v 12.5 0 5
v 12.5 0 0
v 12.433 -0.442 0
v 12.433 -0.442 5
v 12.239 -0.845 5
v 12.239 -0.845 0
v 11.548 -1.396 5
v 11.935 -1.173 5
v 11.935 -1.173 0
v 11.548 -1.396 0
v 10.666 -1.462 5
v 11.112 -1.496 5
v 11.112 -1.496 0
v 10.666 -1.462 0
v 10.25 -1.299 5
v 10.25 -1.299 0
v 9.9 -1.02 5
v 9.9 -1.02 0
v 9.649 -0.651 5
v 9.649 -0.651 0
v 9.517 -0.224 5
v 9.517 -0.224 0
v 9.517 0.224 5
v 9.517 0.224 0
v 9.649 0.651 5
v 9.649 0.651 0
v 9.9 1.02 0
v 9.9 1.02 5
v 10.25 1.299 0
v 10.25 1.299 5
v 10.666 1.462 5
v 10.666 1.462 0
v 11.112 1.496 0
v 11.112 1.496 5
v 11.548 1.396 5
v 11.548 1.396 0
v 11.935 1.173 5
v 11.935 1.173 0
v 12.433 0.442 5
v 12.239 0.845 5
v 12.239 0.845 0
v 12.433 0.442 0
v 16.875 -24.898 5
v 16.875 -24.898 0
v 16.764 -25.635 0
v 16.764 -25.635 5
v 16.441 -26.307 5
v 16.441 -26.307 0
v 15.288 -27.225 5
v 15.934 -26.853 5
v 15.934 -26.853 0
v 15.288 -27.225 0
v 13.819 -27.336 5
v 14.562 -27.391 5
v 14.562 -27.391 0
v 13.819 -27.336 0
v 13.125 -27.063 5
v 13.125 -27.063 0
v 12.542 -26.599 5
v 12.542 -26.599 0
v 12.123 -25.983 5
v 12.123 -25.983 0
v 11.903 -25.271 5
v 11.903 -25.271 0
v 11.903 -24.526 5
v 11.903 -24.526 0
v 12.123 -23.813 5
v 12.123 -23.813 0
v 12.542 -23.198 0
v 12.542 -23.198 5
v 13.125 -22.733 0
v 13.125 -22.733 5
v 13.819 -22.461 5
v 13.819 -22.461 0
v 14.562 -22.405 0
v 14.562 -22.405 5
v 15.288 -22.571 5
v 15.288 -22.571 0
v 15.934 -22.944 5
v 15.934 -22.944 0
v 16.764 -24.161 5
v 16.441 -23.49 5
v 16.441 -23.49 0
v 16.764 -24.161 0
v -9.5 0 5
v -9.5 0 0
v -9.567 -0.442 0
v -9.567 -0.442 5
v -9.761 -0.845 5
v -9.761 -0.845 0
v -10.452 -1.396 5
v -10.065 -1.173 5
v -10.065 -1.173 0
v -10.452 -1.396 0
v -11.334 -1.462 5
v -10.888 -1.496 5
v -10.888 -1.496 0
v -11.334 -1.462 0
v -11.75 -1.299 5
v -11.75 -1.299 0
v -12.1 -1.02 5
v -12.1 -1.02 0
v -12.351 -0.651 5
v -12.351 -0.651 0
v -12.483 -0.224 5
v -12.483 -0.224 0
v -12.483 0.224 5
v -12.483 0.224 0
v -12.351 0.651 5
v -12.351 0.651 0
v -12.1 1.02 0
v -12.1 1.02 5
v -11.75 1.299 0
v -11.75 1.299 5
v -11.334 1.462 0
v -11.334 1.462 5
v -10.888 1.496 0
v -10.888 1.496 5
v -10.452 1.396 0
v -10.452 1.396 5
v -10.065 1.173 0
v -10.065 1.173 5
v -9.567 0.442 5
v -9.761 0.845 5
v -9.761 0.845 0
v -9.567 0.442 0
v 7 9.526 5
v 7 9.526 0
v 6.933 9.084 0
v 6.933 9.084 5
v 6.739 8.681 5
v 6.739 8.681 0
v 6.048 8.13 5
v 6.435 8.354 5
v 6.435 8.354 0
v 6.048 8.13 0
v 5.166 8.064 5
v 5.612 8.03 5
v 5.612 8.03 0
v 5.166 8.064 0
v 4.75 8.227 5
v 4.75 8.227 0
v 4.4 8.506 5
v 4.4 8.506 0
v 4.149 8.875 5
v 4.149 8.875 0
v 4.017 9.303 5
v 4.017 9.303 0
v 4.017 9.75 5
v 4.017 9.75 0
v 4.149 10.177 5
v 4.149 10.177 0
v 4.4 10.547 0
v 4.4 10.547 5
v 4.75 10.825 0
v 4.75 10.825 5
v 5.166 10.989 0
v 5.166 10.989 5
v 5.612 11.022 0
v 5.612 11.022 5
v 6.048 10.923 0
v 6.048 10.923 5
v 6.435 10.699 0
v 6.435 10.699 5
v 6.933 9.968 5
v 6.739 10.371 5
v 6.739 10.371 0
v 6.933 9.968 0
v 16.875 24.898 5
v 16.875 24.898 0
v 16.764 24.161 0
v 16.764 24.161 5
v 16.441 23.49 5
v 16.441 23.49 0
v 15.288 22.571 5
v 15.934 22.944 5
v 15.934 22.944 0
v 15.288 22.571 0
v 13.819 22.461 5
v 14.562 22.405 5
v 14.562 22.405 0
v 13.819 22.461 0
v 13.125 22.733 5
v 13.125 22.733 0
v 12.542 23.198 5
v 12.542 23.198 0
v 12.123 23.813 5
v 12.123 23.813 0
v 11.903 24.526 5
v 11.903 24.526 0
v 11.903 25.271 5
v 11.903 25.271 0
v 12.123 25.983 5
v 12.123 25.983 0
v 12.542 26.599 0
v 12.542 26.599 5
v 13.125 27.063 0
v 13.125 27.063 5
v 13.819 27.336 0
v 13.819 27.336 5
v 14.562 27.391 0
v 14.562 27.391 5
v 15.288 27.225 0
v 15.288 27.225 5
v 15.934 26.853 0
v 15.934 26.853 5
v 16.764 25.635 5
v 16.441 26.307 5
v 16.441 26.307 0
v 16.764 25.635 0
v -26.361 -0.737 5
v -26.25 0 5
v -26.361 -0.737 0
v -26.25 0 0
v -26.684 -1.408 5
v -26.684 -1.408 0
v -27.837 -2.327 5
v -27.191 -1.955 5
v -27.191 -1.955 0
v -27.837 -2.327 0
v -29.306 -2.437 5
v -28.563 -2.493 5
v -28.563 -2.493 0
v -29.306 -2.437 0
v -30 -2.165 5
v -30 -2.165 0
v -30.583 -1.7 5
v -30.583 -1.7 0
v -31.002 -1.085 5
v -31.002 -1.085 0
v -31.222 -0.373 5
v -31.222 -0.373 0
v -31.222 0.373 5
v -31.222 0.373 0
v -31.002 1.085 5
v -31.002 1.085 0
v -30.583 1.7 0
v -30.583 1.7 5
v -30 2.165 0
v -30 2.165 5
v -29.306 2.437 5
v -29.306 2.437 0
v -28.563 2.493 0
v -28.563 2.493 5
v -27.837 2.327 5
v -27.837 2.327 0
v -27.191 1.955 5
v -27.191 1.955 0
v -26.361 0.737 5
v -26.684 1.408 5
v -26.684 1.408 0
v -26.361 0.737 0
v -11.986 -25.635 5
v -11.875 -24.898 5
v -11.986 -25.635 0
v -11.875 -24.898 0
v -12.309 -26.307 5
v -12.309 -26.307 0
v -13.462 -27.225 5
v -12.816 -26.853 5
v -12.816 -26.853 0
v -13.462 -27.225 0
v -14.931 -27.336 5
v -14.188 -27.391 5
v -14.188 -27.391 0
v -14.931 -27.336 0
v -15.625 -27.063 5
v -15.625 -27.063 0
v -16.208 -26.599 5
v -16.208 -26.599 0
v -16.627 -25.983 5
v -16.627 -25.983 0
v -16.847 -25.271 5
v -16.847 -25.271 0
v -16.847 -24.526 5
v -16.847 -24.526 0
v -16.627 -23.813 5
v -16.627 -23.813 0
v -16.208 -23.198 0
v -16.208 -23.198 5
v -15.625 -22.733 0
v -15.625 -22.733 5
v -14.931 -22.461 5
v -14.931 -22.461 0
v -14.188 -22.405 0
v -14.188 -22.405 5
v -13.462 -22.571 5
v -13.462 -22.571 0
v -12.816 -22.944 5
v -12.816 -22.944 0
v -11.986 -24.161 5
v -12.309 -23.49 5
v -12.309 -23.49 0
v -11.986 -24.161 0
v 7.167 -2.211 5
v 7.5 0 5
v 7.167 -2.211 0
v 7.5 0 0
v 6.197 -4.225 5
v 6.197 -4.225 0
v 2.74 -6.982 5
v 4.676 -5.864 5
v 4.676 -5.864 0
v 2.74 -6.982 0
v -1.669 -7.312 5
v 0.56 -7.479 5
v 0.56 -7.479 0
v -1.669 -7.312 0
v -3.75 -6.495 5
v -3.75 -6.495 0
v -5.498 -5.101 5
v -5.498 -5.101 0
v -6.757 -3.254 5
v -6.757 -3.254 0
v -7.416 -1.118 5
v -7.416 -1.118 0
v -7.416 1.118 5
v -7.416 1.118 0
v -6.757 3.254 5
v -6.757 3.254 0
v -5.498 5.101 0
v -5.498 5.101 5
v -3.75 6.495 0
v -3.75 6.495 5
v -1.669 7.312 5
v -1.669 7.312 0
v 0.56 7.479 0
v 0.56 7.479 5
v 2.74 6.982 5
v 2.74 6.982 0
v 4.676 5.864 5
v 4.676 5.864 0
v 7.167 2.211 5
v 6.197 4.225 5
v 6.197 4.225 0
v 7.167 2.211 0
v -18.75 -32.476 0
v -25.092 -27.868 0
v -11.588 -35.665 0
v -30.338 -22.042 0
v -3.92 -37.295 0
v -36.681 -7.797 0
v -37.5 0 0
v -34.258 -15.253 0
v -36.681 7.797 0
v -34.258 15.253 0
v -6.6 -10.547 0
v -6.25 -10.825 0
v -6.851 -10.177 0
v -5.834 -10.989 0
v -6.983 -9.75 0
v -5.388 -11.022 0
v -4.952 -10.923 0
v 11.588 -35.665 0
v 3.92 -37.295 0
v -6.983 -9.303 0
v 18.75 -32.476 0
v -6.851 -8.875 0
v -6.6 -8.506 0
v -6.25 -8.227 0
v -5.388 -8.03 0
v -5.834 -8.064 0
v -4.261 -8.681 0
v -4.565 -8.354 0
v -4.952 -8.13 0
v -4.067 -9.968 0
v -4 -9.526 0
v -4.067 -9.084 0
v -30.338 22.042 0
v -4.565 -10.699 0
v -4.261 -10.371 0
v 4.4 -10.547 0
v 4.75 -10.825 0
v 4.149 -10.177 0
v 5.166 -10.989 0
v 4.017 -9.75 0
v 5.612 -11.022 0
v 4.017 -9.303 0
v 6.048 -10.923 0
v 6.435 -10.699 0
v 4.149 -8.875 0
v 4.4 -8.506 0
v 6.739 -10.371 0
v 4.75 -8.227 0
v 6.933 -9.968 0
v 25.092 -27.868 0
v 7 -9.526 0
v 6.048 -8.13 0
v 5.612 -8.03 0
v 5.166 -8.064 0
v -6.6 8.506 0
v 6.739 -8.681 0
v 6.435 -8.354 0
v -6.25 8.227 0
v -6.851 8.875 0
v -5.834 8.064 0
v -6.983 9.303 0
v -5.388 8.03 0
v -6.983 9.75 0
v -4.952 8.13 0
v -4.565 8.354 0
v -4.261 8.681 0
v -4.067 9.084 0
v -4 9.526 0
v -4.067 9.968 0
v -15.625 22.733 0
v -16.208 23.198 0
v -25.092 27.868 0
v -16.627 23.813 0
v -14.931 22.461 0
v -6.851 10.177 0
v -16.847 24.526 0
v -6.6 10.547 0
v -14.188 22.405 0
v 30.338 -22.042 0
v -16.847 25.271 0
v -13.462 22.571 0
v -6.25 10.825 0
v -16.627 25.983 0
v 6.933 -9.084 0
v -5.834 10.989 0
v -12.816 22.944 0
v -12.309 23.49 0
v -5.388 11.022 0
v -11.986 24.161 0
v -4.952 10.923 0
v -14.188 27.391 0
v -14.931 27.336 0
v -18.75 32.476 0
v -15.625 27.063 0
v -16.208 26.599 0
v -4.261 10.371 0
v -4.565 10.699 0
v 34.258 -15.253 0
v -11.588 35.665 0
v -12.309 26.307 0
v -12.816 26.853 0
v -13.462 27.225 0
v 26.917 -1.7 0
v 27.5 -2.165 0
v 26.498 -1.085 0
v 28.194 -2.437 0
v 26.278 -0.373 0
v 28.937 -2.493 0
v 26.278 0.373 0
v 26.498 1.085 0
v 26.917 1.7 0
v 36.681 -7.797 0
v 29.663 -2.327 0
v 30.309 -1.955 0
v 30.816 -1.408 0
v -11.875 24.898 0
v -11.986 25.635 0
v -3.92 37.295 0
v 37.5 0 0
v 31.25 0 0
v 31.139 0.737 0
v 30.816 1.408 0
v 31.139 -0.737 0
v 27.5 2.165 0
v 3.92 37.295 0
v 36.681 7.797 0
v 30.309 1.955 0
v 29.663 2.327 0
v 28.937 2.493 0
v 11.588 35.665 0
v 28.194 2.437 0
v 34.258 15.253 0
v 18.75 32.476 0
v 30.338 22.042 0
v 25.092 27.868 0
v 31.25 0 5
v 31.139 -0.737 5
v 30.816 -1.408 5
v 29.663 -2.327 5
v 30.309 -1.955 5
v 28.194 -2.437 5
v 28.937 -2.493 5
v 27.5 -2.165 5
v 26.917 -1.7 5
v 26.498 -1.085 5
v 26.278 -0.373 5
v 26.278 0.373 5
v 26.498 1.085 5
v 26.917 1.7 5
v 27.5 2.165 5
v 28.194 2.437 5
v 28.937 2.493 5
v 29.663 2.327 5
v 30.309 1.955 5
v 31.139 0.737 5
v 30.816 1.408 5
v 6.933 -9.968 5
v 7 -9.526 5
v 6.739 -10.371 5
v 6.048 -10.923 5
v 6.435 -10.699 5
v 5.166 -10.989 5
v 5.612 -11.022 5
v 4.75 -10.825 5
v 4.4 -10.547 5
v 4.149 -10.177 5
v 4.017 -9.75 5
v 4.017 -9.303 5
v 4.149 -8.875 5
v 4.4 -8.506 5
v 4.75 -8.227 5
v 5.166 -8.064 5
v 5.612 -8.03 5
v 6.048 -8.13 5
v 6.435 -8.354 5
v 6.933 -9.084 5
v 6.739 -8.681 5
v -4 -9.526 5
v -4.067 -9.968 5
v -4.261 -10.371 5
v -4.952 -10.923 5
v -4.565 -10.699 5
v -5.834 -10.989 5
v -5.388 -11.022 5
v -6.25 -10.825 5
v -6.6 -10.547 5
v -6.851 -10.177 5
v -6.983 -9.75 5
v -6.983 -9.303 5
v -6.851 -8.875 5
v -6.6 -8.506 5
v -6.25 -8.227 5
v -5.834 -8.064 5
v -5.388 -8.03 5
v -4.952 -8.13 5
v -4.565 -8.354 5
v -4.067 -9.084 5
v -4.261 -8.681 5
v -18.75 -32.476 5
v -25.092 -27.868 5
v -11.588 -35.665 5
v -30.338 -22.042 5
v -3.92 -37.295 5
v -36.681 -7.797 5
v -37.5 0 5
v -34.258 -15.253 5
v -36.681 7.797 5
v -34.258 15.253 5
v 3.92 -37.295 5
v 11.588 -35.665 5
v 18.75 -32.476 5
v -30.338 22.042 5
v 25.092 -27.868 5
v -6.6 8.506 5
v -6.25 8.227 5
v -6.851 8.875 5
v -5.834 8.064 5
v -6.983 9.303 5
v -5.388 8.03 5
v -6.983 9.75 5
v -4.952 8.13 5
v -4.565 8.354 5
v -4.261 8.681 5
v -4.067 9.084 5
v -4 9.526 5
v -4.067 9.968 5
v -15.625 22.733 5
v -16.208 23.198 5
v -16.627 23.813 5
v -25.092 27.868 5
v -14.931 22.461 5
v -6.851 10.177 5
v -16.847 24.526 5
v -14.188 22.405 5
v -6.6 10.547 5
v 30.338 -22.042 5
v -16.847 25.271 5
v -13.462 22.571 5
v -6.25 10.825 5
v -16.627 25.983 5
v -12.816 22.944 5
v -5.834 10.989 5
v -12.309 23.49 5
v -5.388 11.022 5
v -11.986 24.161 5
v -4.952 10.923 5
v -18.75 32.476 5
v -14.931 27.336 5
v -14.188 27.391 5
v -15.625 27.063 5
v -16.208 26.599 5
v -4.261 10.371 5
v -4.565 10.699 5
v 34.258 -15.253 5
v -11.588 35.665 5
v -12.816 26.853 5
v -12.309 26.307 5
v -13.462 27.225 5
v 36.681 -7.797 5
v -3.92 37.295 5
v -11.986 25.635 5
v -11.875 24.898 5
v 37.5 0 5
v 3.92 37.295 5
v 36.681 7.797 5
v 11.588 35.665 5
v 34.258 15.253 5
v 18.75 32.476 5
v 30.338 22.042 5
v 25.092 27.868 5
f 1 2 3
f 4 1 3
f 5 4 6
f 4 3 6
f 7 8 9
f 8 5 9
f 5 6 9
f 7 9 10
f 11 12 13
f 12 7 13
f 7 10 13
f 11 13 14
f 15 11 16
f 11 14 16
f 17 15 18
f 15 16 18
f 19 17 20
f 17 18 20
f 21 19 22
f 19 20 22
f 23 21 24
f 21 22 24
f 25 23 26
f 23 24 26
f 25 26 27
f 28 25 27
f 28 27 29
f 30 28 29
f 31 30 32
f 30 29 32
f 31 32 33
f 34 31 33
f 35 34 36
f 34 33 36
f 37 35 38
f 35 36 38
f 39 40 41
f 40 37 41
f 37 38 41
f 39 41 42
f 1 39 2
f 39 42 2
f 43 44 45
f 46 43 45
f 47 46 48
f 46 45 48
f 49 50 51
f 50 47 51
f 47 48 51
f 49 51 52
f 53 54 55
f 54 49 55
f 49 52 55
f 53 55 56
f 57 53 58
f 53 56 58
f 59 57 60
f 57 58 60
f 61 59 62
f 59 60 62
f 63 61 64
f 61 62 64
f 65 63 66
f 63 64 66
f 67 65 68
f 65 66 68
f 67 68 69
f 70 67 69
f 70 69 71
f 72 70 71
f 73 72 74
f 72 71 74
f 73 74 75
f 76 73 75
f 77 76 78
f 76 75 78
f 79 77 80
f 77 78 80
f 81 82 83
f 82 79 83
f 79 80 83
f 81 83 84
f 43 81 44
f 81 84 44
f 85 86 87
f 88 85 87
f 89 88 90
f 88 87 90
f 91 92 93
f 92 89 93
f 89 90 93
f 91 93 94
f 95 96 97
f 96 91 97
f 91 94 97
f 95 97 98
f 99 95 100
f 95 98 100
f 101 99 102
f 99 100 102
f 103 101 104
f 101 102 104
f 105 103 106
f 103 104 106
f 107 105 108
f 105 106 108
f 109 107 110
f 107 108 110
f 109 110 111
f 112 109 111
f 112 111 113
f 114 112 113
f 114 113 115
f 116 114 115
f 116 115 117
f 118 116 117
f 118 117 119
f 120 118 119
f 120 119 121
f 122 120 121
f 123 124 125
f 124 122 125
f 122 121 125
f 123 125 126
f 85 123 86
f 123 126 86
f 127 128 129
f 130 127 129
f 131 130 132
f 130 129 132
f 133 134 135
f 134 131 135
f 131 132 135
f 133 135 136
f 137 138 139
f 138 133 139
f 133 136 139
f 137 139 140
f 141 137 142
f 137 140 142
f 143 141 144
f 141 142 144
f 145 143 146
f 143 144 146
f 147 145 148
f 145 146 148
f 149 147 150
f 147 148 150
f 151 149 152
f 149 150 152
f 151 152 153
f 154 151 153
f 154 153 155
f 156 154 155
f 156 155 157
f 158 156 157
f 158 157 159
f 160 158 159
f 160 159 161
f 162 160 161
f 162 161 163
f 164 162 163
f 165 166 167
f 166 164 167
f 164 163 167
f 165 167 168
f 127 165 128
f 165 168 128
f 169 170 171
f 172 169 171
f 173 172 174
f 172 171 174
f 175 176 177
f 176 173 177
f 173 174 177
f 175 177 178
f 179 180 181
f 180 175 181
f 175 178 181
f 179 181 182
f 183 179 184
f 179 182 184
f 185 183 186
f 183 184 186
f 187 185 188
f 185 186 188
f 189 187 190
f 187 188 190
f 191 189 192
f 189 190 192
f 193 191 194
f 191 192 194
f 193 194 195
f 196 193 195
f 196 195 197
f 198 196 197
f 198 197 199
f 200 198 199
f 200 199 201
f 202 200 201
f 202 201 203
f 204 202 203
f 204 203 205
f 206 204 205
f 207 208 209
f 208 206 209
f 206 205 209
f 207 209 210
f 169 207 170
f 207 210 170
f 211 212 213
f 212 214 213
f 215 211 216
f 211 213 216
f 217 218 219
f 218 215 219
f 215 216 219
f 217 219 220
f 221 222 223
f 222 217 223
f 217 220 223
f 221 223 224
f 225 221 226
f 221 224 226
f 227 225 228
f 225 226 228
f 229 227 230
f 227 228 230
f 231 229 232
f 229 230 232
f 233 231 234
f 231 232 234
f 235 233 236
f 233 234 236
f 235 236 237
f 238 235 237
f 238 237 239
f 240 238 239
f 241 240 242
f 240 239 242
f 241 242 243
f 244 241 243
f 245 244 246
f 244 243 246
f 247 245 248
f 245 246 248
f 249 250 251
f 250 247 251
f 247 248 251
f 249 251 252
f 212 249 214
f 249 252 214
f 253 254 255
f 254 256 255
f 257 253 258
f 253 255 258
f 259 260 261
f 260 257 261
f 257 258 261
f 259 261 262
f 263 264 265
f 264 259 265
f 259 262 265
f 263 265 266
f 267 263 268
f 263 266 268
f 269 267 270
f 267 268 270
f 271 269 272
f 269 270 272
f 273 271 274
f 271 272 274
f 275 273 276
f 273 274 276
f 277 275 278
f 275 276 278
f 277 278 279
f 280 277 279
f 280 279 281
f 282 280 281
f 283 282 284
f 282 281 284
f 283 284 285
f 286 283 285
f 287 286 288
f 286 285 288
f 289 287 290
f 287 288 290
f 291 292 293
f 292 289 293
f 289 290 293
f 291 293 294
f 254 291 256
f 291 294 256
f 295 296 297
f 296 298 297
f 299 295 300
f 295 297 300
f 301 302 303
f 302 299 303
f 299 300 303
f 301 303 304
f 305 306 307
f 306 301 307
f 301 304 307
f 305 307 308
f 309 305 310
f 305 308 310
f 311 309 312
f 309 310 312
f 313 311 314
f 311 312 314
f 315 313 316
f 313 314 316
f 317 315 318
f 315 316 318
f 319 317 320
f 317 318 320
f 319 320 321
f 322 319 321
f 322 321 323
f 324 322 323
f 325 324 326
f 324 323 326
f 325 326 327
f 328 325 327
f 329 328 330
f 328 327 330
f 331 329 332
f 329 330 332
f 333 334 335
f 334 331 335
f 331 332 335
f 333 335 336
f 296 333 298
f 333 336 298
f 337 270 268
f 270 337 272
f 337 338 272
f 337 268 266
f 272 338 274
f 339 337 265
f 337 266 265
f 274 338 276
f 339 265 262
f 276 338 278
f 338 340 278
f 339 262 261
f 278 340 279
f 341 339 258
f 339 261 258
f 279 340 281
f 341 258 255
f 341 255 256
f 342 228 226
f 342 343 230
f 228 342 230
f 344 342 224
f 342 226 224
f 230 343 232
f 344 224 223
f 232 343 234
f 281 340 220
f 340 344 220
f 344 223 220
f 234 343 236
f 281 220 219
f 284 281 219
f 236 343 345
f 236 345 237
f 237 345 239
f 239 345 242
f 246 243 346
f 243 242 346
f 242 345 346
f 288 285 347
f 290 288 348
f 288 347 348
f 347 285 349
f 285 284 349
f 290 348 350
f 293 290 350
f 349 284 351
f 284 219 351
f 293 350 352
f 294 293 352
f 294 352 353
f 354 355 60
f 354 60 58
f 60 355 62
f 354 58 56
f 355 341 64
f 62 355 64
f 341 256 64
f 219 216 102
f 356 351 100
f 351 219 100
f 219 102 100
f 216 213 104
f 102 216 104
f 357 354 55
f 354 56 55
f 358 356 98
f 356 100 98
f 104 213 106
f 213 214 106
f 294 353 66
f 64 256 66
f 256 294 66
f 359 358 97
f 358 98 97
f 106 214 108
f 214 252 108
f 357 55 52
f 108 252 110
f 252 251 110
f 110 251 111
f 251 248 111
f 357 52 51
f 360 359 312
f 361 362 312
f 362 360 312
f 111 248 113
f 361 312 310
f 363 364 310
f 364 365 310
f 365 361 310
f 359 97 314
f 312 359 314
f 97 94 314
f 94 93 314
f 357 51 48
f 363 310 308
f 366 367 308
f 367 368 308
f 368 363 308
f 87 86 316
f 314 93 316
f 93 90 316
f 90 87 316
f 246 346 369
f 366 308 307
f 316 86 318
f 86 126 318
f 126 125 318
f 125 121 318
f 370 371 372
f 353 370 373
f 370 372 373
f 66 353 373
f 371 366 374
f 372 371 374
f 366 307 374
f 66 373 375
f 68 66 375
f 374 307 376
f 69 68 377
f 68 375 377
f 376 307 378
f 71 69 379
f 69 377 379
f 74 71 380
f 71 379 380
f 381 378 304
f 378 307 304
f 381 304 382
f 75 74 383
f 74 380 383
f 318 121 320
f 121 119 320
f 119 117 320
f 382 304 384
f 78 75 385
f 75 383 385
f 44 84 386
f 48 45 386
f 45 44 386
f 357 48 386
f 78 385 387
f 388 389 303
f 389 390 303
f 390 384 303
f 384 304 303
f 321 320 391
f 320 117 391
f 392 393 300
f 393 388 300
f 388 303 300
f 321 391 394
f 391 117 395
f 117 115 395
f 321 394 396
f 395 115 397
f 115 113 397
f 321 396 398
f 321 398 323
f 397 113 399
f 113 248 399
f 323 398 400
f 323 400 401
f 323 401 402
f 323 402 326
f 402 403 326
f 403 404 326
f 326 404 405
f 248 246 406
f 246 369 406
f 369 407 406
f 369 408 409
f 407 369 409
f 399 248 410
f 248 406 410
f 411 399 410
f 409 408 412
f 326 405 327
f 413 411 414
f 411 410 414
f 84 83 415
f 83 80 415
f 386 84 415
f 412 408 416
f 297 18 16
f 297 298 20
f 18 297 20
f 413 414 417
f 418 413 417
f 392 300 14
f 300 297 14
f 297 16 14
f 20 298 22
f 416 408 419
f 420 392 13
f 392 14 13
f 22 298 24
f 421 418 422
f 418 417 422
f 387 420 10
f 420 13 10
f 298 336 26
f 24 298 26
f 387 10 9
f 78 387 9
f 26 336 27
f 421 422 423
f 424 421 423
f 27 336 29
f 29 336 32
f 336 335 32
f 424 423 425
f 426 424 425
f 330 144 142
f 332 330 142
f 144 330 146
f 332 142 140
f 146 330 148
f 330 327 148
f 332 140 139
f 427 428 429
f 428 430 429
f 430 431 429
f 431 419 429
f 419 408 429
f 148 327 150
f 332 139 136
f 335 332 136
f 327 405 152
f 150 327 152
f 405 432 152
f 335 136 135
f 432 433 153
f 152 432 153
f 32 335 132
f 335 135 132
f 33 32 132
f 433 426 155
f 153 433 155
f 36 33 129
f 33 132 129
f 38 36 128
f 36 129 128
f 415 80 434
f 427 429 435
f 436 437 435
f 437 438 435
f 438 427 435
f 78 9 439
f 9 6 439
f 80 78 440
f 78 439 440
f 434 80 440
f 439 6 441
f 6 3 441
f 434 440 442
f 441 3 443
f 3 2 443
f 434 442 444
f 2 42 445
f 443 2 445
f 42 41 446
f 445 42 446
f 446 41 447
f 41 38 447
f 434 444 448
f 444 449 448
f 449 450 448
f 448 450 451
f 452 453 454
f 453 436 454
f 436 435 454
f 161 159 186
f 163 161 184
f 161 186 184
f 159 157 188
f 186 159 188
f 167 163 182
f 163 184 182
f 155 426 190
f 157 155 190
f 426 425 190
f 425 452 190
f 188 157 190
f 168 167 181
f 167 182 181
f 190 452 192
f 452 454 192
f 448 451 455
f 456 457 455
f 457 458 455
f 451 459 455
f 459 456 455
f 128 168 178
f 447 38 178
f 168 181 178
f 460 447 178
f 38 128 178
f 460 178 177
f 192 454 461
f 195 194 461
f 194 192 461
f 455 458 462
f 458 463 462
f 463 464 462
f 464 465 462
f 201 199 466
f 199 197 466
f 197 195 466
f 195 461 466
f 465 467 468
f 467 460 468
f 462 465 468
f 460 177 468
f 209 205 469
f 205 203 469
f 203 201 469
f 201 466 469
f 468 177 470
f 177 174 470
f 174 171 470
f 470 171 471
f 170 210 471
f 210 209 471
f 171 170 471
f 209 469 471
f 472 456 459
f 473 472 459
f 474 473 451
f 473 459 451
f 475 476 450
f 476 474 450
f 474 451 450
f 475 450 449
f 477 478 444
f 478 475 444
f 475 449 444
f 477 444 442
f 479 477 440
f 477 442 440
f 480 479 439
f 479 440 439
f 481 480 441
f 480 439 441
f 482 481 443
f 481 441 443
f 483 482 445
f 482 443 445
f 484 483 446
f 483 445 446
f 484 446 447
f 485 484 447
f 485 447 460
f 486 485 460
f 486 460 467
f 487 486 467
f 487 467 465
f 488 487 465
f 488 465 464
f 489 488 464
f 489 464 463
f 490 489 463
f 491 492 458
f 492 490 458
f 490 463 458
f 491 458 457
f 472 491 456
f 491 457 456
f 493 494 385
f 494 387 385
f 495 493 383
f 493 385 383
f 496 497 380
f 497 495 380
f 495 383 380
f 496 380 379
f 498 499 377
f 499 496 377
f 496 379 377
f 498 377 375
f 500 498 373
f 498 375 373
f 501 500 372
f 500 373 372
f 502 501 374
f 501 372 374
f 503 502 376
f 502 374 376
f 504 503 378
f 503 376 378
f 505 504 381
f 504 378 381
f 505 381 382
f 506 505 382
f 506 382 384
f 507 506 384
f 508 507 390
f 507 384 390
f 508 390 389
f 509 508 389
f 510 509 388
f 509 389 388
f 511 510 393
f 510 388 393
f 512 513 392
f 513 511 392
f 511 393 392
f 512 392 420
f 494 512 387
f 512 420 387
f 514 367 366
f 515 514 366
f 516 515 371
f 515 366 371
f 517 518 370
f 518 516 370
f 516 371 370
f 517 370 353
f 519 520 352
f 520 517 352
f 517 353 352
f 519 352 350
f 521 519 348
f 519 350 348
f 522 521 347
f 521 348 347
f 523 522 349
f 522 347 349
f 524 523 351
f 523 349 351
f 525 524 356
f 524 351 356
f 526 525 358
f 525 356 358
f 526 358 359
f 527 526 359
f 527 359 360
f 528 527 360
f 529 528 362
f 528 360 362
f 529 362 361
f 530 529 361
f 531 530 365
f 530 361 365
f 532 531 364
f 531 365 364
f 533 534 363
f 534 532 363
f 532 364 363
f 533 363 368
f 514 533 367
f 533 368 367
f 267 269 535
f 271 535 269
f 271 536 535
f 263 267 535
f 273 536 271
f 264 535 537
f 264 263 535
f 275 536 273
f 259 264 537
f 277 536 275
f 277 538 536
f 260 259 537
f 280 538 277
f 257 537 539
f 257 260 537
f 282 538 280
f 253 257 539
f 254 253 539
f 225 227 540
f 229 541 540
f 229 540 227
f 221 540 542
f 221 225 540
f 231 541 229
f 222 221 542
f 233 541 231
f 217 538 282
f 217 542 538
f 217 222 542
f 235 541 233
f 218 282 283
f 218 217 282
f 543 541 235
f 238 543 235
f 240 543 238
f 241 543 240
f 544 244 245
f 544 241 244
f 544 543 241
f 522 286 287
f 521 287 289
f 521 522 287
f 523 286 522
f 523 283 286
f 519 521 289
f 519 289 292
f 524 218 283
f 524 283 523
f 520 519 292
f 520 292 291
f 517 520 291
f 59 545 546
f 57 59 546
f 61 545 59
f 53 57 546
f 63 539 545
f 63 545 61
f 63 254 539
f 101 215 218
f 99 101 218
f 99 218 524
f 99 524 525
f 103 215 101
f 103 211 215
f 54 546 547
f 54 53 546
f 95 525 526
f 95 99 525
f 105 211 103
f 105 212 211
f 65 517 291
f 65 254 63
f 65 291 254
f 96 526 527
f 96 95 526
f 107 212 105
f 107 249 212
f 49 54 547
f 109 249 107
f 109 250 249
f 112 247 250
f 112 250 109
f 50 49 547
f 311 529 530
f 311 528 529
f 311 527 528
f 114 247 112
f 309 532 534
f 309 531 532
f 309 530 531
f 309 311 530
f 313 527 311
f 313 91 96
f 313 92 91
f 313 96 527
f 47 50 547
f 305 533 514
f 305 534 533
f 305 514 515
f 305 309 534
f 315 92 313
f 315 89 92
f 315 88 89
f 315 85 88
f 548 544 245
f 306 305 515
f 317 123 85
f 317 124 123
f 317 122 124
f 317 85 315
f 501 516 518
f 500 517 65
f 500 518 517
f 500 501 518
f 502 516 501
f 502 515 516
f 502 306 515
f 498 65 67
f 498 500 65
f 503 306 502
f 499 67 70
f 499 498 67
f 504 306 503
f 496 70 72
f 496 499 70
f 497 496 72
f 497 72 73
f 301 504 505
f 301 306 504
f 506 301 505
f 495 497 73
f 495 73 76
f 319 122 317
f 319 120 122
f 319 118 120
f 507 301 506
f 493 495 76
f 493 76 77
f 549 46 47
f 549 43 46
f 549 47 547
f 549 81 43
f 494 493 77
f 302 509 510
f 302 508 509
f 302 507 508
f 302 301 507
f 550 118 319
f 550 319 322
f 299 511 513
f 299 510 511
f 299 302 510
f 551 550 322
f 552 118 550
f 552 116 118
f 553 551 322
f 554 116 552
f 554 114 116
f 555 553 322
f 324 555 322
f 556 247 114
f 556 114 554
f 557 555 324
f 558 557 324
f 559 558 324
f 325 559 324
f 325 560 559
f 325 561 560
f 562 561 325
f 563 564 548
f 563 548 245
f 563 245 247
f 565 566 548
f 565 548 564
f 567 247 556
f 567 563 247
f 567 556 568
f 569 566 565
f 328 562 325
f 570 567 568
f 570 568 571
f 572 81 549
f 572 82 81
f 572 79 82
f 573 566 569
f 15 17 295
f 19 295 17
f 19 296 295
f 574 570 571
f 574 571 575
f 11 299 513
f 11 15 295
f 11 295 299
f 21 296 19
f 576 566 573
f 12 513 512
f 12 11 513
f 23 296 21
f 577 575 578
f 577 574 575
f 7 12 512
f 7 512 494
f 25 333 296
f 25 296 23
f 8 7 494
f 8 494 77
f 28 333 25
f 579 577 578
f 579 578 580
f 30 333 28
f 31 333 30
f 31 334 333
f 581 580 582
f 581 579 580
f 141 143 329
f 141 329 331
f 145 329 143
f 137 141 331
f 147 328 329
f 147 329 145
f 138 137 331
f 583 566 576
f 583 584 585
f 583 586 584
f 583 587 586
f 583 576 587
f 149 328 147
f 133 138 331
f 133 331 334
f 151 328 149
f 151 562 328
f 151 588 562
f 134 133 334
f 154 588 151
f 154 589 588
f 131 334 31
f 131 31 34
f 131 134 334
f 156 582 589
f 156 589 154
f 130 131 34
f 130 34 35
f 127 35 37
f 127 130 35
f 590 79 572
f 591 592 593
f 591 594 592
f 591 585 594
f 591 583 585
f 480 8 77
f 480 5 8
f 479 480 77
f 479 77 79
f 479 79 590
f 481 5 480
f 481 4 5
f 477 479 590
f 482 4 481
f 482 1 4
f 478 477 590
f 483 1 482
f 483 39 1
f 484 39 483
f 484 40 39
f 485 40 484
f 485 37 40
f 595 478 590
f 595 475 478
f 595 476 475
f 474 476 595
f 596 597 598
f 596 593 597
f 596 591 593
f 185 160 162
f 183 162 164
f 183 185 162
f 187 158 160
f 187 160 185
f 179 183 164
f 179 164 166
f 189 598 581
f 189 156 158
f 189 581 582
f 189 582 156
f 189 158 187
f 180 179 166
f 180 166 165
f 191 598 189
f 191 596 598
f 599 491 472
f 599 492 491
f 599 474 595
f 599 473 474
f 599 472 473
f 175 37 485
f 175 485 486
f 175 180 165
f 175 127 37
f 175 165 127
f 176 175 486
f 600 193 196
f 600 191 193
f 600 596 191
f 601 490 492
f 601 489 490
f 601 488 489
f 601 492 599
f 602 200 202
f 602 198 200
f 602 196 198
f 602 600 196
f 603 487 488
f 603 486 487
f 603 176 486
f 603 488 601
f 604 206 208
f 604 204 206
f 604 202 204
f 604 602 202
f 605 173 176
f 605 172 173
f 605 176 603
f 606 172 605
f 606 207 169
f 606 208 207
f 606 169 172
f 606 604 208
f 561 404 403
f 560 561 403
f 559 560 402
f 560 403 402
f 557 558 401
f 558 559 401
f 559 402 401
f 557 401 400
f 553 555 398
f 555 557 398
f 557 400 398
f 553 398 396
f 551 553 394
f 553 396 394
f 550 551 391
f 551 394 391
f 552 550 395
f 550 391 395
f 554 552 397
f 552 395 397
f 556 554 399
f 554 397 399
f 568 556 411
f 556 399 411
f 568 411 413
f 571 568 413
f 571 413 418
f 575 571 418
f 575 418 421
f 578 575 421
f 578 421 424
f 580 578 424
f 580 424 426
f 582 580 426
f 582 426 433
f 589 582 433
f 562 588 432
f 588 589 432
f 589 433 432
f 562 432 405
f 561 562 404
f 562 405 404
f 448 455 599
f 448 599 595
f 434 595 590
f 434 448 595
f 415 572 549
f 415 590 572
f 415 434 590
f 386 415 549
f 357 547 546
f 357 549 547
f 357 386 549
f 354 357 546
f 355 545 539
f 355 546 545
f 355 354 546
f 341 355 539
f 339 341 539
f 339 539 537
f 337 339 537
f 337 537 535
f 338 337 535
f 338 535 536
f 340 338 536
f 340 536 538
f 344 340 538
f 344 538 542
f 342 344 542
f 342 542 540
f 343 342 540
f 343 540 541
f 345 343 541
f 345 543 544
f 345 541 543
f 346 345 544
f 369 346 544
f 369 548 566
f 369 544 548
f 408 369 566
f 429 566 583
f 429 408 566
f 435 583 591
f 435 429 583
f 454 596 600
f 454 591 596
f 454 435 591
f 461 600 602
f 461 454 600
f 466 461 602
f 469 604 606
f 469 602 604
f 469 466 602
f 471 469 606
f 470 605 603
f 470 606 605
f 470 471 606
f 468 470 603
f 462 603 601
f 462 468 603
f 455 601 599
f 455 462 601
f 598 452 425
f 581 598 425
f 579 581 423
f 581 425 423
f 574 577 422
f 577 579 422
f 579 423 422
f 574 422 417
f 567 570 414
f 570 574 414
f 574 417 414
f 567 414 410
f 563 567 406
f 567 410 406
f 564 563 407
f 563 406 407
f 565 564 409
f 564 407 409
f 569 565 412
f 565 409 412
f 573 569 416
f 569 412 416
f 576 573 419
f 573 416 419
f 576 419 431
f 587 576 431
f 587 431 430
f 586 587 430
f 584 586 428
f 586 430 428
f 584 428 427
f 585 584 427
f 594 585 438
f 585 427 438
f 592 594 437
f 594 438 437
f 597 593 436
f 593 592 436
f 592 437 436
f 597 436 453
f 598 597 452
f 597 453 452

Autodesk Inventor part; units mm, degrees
ref_plane "YZ Plane" through (0, 0, 0) normal (1, 0, 0) x (0, 1, 0)
ref_plane "XZ Plane" through (0, 0, 0) normal (0, 1, 0) x (-1, 0, 0)
ref_plane "XY Plane" through (0, 0, 0) normal (0, 0, 1) x (1, 0, 0)
sketch "Sketch1" plane through (0, 0, 0) normal (0, 0, 1) x (1, 0, 0)
  circle A0 centre (0, 0) radius 37.5
  circle A1 centre (0, 0) radius 7.5
  circle A2 centre (28.75, 0) radius 2.5
  circle A3 centre (11, 0) radius 1.5
  circle A4 centre (14.375, 24.8982) radius 2.5
  circle A5 centre (5.5, 9.5263) radius 1.5
  circle A6 centre (-14.375, 24.8982) radius 2.5
  circle A7 centre (-5.5, 9.5263) radius 1.5
  circle A8 centre (-28.75, 0) radius 2.5
  circle A9 centre (-11, 0) radius 1.5
  circle A10 centre (-14.375, -24.8982) radius 2.5
  circle A11 centre (-5.5, -9.5263) radius 1.5
  circle A12 centre (14.375, -24.8982) radius 2.5
  circle A13 centre (5.5, -9.5263) radius 1.5
  dimension "d0" = 75
  dimension "d1" = 15
  dimension "d2" = 5
  dimension "d3" = 3
  dimension "d4" = 28.75
  dimension "d5" = 11
  dimension "d8" = 360
extrude "Extrusion1" add sketch "Sketch1" along normal blind 5
properties part number "TA04" material "ABS Plastic"
